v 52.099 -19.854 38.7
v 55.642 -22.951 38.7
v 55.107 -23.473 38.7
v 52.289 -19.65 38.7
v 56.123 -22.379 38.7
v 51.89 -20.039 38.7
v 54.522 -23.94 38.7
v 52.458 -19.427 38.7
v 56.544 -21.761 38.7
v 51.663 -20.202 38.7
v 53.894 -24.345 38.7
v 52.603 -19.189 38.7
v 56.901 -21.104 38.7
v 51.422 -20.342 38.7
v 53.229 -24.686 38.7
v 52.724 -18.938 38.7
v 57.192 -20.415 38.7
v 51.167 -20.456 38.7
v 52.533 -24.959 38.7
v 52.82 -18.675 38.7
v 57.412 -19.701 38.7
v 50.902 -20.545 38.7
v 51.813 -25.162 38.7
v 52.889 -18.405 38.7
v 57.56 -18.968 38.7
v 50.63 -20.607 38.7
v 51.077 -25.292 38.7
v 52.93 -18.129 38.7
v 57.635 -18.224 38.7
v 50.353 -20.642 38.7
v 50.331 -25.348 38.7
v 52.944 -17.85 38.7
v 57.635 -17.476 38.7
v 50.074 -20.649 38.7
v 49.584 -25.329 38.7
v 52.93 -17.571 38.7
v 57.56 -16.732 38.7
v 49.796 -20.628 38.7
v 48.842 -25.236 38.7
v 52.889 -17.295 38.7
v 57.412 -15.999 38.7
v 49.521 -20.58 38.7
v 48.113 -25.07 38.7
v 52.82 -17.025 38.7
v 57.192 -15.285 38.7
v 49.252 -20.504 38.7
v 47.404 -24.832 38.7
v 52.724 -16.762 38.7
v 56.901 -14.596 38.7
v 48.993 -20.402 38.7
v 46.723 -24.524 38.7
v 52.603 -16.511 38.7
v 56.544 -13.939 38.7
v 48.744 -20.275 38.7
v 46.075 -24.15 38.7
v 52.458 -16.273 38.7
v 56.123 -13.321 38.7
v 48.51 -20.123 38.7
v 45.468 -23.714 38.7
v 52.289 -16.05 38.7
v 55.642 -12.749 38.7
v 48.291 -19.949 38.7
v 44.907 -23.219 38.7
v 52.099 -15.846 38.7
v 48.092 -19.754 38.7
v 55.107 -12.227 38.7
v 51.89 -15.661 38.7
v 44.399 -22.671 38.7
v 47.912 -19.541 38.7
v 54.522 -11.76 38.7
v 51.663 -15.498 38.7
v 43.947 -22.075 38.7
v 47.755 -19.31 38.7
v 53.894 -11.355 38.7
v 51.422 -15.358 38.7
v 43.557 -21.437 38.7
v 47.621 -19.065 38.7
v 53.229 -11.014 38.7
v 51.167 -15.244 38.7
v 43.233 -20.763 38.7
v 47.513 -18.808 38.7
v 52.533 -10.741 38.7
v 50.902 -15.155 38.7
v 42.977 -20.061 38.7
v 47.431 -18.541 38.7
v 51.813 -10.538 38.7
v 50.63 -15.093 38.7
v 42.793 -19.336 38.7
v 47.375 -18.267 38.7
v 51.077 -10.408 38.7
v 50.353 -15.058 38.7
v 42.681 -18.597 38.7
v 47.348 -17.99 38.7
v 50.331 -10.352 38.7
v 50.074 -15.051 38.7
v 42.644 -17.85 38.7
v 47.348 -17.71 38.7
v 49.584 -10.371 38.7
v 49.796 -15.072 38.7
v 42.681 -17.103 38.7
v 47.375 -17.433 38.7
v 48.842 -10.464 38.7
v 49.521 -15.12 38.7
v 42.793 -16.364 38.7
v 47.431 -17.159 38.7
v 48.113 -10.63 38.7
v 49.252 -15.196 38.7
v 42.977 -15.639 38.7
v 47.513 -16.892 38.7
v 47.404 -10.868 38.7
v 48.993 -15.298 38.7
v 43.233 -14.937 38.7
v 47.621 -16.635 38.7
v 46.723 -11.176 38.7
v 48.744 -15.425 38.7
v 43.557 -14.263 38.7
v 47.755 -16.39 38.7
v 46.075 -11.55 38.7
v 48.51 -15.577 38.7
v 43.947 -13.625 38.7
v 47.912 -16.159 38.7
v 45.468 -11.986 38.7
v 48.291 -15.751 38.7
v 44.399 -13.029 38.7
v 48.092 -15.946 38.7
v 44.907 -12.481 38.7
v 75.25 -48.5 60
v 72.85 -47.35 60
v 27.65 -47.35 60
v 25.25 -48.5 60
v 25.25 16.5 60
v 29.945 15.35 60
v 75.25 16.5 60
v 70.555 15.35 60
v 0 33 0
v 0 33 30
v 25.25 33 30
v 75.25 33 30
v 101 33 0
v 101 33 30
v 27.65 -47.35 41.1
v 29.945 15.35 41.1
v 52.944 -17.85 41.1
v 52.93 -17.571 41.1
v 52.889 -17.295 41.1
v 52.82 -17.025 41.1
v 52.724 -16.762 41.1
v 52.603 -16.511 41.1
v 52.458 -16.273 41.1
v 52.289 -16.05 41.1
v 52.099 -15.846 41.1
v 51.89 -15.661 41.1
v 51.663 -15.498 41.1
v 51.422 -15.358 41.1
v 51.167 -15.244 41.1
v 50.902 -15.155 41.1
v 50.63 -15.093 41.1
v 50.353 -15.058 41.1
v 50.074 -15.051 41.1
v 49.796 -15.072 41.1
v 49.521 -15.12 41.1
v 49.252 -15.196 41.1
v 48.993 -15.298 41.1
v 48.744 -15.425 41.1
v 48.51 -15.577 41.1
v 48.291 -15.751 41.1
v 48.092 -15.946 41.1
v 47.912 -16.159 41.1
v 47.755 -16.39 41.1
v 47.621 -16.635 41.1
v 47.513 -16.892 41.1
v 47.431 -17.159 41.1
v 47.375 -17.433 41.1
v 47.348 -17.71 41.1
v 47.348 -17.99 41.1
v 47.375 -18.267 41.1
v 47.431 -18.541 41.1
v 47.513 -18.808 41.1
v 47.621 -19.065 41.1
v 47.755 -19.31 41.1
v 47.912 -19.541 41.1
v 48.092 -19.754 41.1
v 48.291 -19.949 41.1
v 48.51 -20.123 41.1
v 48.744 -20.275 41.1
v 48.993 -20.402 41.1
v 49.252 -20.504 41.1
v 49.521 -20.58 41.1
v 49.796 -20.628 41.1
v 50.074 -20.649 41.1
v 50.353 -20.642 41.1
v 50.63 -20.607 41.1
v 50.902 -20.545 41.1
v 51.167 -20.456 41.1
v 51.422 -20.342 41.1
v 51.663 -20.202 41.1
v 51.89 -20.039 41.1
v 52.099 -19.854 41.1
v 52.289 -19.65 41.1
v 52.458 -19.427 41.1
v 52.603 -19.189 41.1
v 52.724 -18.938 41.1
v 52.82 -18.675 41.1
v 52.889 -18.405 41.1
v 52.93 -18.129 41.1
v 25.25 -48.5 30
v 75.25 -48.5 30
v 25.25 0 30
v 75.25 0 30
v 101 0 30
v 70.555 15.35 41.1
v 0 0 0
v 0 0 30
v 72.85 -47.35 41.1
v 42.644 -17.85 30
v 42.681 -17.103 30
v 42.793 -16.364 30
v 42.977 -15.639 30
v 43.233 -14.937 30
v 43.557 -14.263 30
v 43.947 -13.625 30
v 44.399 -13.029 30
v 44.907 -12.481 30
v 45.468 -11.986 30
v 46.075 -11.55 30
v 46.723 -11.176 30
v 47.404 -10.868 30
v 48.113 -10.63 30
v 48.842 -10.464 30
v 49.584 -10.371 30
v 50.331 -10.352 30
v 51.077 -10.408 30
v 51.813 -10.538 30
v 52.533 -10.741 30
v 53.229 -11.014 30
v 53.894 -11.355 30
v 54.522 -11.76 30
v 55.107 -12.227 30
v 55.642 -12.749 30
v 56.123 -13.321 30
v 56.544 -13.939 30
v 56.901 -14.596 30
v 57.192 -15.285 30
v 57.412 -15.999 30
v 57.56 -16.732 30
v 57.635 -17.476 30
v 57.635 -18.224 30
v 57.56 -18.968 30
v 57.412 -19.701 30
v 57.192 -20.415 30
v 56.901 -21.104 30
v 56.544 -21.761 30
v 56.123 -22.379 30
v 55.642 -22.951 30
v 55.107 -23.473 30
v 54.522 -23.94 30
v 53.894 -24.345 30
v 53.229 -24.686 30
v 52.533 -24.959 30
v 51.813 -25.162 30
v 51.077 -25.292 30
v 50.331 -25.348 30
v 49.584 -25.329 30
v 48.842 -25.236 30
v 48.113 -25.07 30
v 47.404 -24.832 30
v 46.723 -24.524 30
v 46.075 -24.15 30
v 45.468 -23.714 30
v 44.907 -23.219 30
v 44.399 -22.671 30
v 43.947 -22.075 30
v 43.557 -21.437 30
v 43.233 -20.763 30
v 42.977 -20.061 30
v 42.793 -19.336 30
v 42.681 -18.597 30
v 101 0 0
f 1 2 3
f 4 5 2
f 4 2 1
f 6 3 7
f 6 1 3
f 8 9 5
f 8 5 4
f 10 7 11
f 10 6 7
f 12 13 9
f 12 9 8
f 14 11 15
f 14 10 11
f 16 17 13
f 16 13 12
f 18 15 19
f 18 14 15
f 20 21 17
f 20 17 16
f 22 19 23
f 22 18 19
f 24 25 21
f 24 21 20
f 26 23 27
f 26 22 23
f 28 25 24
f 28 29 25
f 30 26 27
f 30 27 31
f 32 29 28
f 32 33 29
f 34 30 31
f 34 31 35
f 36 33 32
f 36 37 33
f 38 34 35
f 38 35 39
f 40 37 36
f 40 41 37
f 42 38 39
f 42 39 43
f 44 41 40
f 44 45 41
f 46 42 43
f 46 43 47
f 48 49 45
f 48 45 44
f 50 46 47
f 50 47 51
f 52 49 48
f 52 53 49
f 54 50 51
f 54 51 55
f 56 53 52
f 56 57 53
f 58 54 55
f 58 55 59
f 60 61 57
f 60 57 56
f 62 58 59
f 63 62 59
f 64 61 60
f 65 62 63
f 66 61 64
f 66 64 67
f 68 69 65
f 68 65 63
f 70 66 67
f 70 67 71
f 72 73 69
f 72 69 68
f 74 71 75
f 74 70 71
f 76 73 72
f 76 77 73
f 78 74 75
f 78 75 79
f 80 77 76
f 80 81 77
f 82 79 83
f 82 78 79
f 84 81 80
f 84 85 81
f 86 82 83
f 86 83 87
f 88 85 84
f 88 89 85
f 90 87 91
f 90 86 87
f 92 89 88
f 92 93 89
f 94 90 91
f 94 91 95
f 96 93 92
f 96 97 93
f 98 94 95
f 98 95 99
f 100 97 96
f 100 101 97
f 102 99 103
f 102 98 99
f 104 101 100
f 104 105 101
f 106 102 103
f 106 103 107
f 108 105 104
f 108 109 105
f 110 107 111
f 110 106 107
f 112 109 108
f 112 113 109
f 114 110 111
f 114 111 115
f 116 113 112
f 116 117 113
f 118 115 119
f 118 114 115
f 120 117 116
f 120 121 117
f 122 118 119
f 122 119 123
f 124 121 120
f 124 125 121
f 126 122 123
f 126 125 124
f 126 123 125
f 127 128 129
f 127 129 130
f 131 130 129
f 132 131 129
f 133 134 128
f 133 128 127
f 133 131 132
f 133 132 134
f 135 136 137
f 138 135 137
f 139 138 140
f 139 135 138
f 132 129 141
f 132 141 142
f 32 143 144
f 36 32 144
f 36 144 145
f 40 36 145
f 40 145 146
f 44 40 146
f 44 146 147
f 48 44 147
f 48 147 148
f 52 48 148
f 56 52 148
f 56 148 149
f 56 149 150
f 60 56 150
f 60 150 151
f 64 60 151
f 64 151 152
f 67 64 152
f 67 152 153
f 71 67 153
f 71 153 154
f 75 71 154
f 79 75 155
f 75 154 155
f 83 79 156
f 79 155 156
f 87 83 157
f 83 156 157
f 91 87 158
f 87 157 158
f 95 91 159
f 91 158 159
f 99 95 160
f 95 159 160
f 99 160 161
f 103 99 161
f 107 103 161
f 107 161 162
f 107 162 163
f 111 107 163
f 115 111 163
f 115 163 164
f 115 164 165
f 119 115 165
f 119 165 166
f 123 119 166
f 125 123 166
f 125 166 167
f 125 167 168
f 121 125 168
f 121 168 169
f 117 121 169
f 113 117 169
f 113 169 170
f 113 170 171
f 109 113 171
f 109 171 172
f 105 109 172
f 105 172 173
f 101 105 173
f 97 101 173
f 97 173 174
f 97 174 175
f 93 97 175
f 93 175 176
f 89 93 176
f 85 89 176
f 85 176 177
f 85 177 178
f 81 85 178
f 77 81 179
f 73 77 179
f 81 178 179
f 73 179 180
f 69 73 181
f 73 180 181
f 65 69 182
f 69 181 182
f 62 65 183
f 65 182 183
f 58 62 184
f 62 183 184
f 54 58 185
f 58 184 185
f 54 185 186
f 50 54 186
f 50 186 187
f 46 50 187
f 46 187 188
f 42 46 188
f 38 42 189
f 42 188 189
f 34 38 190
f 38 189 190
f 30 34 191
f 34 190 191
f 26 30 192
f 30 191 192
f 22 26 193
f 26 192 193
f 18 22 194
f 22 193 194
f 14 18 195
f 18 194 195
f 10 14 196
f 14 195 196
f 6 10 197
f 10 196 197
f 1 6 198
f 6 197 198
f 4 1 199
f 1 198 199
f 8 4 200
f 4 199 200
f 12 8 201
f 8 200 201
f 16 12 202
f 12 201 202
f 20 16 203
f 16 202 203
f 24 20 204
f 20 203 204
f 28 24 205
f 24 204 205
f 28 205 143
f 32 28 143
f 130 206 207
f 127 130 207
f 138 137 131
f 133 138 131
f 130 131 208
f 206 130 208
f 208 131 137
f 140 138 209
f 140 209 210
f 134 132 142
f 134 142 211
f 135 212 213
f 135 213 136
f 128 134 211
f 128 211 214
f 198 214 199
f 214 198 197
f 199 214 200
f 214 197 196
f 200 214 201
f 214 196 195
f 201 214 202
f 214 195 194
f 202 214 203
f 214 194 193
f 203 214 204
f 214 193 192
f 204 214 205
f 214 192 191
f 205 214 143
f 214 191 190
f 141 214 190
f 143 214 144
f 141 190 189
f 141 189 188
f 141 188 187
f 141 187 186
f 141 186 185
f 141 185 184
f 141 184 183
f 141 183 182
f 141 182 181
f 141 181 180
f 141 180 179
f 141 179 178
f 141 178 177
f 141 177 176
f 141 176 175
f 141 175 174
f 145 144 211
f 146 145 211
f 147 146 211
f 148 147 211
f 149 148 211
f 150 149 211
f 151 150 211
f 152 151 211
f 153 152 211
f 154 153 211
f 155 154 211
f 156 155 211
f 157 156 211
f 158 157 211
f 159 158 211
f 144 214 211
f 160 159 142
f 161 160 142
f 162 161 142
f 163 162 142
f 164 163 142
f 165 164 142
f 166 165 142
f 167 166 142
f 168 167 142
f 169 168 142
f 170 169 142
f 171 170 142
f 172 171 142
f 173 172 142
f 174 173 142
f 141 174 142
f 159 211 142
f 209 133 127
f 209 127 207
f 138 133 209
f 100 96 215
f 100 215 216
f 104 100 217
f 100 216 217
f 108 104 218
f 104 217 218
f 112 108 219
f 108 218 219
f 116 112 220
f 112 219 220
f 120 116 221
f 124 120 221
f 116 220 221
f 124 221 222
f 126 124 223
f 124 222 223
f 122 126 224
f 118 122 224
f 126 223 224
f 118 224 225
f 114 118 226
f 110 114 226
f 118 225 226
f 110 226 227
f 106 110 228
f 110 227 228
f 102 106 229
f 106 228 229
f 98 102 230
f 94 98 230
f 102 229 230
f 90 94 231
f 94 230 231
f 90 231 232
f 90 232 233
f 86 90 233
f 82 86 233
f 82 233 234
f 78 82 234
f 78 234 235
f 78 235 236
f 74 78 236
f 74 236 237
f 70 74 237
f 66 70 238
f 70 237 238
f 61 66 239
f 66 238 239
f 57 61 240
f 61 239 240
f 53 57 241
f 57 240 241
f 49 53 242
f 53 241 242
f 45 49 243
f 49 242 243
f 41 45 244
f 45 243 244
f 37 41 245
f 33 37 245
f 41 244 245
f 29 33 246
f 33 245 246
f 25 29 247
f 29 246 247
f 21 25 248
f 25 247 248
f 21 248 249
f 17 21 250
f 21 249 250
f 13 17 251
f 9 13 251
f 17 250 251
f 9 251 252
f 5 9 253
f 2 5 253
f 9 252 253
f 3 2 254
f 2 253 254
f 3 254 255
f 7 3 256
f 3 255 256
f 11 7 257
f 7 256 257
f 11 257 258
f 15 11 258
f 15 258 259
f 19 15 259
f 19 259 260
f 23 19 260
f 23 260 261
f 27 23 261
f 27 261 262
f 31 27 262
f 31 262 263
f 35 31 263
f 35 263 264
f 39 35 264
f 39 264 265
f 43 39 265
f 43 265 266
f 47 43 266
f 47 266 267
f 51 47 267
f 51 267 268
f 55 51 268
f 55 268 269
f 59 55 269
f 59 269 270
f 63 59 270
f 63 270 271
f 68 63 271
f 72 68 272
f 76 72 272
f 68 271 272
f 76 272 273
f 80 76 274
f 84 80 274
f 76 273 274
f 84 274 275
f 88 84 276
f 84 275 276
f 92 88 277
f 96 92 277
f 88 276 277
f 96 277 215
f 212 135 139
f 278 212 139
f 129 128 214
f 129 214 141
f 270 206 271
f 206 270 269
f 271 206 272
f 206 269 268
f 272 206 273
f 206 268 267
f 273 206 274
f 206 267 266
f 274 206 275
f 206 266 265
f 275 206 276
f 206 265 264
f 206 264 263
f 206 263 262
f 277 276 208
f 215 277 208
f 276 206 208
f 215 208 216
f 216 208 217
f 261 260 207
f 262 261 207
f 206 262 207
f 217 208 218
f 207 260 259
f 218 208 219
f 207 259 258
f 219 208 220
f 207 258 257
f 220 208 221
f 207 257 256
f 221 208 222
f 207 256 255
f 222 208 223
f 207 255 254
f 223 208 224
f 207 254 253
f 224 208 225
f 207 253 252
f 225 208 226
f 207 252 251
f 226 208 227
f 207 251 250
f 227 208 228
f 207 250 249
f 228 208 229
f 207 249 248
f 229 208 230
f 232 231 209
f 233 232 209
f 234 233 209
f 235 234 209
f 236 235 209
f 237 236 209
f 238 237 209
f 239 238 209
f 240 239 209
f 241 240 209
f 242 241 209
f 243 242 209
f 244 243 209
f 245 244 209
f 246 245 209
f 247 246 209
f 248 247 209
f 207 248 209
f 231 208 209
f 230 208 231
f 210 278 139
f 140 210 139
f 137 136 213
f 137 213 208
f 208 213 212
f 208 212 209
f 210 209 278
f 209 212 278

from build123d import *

# Parameters (mm, degrees)
SKICA1_W                 = 101
SKICA1_H                 = 33
P_IDAT_VYSUNUT_M1_DEPTH  = 30
SKICA2_W                 = 50
SKICA2_H                 = 65
P_IDAT_VYSUNUT_M2_DEPTH  = 30
P_IDAT_VYSUNUT_M3_DEPTH  = 50
ODEBRAT_VYSUNUT_M5_DEPTH = 18.9
SKICA17_R                = 2.8
ODEBRAT_VYSUNUT_M6_DEPTH = 14.2
SKICA18_R                = 7.5
ODEBRAT_VYSUNUT_M7_DEPTH = 8.7


with BuildPart() as part:
    # Skica1 → Přidat vysunutím1 (new body)
    with BuildSketch(Plane.XY):
        with Locations((50.5, 16.5)):
            Rectangle(SKICA1_W, SKICA1_H)
    extrude(amount=P_IDAT_VYSUNUT_M1_DEPTH)

    # Skica2 → Přidat vysunutím2 (add)
    with BuildSketch(Plane.XY.offset(30)):
        with Locations((50.25, -16)):
            Rectangle(SKICA2_W, SKICA2_H)
    extrude(amount=P_IDAT_VYSUNUT_M2_DEPTH)

    # Skica3 → Přidat vysunutím3 (add)
    with BuildSketch(Plane.ZY.offset(-25.25)):
        Polygon((30, 33), (60, 16.5), (30, 16.5), align=None)
    extrude(amount=-P_IDAT_VYSUNUT_M3_DEPTH)

    # Skica6 → Odebrat vysunutím5 (cut)
    with BuildSketch(Plane.XY.offset(60)):
        Polygon((29.945, 15.35), (70.555, 15.35), (72.85, -47.35), (27.65, -47.35), align=None)
    extrude(amount=-ODEBRAT_VYSUNUT_M5_DEPTH, mode=Mode.SUBTRACT)

    # Skica17 → Odebrat vysunutím6 (cut)
    with BuildSketch(Plane.XY.offset(41.1)):
        with Locations((50.144115431, -17.85)):
            Circle(SKICA17_R)
    extrude(amount=-ODEBRAT_VYSUNUT_M6_DEPTH, mode=Mode.SUBTRACT)

    # Skica18 → Odebrat vysunutím7 (cut)
    with BuildSketch(Plane(origin=(0, 0, 30), x_dir=(-1, 0, 0), z_dir=(0, 0, -1))):
        with Locations((-50.144115431, -17.85)):
            Circle(SKICA18_R)
    extrude(amount=-ODEBRAT_VYSUNUT_M7_DEPTH, mode=Mode.SUBTRACT)


solid = part.part
